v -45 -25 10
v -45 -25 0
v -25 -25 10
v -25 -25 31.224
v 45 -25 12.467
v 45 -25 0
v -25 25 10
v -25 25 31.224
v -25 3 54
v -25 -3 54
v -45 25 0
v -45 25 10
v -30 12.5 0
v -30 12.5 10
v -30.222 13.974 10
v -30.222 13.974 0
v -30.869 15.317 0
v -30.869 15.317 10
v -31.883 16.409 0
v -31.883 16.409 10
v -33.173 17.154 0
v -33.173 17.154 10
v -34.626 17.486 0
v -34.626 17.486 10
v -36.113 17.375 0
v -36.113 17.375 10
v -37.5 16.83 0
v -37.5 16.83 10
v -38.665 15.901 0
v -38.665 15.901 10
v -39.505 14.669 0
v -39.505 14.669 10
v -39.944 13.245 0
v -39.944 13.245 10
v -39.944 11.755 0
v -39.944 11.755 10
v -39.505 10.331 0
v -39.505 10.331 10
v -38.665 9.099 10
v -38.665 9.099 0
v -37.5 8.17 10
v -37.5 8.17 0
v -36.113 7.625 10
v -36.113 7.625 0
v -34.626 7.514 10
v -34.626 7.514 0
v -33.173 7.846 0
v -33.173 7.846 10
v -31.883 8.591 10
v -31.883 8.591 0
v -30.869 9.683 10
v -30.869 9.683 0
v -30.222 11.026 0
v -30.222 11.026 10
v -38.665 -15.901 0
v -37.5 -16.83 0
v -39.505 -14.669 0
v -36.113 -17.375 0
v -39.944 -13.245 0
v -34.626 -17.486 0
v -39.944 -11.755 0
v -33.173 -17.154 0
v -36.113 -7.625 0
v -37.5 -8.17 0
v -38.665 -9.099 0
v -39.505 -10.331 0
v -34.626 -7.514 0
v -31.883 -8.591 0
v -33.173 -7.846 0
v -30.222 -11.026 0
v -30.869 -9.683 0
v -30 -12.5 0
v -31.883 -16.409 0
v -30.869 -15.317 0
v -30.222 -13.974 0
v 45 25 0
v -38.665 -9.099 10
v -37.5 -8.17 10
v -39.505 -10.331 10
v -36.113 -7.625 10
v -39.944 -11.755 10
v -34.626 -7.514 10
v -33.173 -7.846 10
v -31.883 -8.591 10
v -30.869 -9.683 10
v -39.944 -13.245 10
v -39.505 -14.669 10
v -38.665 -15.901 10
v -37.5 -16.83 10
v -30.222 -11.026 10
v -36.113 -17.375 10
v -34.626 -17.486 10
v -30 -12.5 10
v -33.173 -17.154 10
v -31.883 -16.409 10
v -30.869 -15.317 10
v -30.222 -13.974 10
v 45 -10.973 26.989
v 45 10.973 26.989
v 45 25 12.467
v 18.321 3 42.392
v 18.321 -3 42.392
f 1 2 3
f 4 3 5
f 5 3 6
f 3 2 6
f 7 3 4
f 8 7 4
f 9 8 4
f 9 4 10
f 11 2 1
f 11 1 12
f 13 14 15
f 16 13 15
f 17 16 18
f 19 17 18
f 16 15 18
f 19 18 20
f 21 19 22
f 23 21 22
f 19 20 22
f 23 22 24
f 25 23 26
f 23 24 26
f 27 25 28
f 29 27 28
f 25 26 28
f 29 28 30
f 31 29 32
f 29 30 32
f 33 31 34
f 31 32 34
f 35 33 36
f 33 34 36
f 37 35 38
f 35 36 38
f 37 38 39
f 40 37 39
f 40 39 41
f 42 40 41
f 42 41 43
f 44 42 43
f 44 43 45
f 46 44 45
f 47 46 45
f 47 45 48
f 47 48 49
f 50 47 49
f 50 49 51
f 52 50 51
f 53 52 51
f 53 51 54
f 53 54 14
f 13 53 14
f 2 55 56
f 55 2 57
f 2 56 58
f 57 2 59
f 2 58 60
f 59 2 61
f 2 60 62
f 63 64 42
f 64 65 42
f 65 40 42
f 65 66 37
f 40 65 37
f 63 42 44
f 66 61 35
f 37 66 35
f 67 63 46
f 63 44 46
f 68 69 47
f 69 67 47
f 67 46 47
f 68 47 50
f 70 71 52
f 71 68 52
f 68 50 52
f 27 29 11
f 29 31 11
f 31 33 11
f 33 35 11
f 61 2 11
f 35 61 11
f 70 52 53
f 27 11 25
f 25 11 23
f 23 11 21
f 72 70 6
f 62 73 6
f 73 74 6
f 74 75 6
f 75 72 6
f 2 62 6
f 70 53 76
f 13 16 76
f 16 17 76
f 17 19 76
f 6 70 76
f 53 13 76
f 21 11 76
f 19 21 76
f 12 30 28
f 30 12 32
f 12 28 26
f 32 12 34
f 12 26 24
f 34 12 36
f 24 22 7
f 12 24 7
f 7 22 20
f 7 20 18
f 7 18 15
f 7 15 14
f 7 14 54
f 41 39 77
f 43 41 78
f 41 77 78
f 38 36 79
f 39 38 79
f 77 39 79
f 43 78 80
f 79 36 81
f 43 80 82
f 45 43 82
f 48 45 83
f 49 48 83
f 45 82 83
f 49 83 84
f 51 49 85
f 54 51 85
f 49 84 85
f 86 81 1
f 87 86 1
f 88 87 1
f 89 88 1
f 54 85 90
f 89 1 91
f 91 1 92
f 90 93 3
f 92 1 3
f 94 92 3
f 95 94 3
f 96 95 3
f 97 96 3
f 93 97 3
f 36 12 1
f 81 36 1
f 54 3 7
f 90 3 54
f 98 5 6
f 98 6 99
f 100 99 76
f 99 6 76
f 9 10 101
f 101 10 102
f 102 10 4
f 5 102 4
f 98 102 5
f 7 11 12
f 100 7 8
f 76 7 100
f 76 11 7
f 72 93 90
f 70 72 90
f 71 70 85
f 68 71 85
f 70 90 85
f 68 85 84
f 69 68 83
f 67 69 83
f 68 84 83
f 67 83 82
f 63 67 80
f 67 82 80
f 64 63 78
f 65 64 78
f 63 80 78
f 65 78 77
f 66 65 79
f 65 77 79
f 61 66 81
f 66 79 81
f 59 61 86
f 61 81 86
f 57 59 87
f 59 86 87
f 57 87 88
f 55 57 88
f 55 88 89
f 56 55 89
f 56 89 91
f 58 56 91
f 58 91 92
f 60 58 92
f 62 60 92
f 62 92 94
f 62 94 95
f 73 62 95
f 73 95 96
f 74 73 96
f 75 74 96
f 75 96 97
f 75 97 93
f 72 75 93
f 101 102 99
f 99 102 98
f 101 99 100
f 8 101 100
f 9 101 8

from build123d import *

# Parameters (mm, degrees)
F0_W     = 90
F0_H     = 50
F1_DEPTH = 54
F2_W     = 20
F2_H     = 44
F3_DEPTH = 50.001
F4_SIZE  = 22
F6_DEPTH = 50.001
F7_R     = 5
F8_DEPTH = 25


with BuildPart() as f1:
    # F0 (on Top) → F1 (new body)
    with BuildSketch(Plane.XY):
        Rectangle(F0_W, F0_H)
    extrude(amount=F1_DEPTH)

    # F2 (on face) → F3 (cut, through all)
    with BuildSketch(Plane.XZ.offset(25)):
        with Locations((-35, 32)):
            Rectangle(F2_W, F2_H)
        Polygon((45, 54), (-25, 54), (45, 35.243557), align=None)
    extrude(amount=-F3_DEPTH, mode=Mode.SUBTRACT)

    # F4
    f4_edges = [f1.edges().sort_by_distance(p)[0] for p in [
        (10, -25, 44.621778),
        (10, 25, 44.621778),
    ]]
    chamfer(f4_edges, length=F4_SIZE)

    # F5 (on face) → F6 (cut, through all)
    with BuildSketch(Plane.XZ.offset(25)):
        Polygon((61.415475, 42.577509), (18, 42.577509), (61.007772, 17.74696), align=None)
    extrude(amount=-F6_DEPTH, mode=Mode.SUBTRACT)

    # F7 (on face) → F8 (cut)
    with BuildSketch(Plane.XY.offset(10)):
        with Locations((-35, 12.5)):
            Circle(F7_R)
        with Locations((-35, -12.5)):
            Circle(F7_R)
    extrude(amount=-F8_DEPTH, mode=Mode.SUBTRACT)


solid = f1.part
